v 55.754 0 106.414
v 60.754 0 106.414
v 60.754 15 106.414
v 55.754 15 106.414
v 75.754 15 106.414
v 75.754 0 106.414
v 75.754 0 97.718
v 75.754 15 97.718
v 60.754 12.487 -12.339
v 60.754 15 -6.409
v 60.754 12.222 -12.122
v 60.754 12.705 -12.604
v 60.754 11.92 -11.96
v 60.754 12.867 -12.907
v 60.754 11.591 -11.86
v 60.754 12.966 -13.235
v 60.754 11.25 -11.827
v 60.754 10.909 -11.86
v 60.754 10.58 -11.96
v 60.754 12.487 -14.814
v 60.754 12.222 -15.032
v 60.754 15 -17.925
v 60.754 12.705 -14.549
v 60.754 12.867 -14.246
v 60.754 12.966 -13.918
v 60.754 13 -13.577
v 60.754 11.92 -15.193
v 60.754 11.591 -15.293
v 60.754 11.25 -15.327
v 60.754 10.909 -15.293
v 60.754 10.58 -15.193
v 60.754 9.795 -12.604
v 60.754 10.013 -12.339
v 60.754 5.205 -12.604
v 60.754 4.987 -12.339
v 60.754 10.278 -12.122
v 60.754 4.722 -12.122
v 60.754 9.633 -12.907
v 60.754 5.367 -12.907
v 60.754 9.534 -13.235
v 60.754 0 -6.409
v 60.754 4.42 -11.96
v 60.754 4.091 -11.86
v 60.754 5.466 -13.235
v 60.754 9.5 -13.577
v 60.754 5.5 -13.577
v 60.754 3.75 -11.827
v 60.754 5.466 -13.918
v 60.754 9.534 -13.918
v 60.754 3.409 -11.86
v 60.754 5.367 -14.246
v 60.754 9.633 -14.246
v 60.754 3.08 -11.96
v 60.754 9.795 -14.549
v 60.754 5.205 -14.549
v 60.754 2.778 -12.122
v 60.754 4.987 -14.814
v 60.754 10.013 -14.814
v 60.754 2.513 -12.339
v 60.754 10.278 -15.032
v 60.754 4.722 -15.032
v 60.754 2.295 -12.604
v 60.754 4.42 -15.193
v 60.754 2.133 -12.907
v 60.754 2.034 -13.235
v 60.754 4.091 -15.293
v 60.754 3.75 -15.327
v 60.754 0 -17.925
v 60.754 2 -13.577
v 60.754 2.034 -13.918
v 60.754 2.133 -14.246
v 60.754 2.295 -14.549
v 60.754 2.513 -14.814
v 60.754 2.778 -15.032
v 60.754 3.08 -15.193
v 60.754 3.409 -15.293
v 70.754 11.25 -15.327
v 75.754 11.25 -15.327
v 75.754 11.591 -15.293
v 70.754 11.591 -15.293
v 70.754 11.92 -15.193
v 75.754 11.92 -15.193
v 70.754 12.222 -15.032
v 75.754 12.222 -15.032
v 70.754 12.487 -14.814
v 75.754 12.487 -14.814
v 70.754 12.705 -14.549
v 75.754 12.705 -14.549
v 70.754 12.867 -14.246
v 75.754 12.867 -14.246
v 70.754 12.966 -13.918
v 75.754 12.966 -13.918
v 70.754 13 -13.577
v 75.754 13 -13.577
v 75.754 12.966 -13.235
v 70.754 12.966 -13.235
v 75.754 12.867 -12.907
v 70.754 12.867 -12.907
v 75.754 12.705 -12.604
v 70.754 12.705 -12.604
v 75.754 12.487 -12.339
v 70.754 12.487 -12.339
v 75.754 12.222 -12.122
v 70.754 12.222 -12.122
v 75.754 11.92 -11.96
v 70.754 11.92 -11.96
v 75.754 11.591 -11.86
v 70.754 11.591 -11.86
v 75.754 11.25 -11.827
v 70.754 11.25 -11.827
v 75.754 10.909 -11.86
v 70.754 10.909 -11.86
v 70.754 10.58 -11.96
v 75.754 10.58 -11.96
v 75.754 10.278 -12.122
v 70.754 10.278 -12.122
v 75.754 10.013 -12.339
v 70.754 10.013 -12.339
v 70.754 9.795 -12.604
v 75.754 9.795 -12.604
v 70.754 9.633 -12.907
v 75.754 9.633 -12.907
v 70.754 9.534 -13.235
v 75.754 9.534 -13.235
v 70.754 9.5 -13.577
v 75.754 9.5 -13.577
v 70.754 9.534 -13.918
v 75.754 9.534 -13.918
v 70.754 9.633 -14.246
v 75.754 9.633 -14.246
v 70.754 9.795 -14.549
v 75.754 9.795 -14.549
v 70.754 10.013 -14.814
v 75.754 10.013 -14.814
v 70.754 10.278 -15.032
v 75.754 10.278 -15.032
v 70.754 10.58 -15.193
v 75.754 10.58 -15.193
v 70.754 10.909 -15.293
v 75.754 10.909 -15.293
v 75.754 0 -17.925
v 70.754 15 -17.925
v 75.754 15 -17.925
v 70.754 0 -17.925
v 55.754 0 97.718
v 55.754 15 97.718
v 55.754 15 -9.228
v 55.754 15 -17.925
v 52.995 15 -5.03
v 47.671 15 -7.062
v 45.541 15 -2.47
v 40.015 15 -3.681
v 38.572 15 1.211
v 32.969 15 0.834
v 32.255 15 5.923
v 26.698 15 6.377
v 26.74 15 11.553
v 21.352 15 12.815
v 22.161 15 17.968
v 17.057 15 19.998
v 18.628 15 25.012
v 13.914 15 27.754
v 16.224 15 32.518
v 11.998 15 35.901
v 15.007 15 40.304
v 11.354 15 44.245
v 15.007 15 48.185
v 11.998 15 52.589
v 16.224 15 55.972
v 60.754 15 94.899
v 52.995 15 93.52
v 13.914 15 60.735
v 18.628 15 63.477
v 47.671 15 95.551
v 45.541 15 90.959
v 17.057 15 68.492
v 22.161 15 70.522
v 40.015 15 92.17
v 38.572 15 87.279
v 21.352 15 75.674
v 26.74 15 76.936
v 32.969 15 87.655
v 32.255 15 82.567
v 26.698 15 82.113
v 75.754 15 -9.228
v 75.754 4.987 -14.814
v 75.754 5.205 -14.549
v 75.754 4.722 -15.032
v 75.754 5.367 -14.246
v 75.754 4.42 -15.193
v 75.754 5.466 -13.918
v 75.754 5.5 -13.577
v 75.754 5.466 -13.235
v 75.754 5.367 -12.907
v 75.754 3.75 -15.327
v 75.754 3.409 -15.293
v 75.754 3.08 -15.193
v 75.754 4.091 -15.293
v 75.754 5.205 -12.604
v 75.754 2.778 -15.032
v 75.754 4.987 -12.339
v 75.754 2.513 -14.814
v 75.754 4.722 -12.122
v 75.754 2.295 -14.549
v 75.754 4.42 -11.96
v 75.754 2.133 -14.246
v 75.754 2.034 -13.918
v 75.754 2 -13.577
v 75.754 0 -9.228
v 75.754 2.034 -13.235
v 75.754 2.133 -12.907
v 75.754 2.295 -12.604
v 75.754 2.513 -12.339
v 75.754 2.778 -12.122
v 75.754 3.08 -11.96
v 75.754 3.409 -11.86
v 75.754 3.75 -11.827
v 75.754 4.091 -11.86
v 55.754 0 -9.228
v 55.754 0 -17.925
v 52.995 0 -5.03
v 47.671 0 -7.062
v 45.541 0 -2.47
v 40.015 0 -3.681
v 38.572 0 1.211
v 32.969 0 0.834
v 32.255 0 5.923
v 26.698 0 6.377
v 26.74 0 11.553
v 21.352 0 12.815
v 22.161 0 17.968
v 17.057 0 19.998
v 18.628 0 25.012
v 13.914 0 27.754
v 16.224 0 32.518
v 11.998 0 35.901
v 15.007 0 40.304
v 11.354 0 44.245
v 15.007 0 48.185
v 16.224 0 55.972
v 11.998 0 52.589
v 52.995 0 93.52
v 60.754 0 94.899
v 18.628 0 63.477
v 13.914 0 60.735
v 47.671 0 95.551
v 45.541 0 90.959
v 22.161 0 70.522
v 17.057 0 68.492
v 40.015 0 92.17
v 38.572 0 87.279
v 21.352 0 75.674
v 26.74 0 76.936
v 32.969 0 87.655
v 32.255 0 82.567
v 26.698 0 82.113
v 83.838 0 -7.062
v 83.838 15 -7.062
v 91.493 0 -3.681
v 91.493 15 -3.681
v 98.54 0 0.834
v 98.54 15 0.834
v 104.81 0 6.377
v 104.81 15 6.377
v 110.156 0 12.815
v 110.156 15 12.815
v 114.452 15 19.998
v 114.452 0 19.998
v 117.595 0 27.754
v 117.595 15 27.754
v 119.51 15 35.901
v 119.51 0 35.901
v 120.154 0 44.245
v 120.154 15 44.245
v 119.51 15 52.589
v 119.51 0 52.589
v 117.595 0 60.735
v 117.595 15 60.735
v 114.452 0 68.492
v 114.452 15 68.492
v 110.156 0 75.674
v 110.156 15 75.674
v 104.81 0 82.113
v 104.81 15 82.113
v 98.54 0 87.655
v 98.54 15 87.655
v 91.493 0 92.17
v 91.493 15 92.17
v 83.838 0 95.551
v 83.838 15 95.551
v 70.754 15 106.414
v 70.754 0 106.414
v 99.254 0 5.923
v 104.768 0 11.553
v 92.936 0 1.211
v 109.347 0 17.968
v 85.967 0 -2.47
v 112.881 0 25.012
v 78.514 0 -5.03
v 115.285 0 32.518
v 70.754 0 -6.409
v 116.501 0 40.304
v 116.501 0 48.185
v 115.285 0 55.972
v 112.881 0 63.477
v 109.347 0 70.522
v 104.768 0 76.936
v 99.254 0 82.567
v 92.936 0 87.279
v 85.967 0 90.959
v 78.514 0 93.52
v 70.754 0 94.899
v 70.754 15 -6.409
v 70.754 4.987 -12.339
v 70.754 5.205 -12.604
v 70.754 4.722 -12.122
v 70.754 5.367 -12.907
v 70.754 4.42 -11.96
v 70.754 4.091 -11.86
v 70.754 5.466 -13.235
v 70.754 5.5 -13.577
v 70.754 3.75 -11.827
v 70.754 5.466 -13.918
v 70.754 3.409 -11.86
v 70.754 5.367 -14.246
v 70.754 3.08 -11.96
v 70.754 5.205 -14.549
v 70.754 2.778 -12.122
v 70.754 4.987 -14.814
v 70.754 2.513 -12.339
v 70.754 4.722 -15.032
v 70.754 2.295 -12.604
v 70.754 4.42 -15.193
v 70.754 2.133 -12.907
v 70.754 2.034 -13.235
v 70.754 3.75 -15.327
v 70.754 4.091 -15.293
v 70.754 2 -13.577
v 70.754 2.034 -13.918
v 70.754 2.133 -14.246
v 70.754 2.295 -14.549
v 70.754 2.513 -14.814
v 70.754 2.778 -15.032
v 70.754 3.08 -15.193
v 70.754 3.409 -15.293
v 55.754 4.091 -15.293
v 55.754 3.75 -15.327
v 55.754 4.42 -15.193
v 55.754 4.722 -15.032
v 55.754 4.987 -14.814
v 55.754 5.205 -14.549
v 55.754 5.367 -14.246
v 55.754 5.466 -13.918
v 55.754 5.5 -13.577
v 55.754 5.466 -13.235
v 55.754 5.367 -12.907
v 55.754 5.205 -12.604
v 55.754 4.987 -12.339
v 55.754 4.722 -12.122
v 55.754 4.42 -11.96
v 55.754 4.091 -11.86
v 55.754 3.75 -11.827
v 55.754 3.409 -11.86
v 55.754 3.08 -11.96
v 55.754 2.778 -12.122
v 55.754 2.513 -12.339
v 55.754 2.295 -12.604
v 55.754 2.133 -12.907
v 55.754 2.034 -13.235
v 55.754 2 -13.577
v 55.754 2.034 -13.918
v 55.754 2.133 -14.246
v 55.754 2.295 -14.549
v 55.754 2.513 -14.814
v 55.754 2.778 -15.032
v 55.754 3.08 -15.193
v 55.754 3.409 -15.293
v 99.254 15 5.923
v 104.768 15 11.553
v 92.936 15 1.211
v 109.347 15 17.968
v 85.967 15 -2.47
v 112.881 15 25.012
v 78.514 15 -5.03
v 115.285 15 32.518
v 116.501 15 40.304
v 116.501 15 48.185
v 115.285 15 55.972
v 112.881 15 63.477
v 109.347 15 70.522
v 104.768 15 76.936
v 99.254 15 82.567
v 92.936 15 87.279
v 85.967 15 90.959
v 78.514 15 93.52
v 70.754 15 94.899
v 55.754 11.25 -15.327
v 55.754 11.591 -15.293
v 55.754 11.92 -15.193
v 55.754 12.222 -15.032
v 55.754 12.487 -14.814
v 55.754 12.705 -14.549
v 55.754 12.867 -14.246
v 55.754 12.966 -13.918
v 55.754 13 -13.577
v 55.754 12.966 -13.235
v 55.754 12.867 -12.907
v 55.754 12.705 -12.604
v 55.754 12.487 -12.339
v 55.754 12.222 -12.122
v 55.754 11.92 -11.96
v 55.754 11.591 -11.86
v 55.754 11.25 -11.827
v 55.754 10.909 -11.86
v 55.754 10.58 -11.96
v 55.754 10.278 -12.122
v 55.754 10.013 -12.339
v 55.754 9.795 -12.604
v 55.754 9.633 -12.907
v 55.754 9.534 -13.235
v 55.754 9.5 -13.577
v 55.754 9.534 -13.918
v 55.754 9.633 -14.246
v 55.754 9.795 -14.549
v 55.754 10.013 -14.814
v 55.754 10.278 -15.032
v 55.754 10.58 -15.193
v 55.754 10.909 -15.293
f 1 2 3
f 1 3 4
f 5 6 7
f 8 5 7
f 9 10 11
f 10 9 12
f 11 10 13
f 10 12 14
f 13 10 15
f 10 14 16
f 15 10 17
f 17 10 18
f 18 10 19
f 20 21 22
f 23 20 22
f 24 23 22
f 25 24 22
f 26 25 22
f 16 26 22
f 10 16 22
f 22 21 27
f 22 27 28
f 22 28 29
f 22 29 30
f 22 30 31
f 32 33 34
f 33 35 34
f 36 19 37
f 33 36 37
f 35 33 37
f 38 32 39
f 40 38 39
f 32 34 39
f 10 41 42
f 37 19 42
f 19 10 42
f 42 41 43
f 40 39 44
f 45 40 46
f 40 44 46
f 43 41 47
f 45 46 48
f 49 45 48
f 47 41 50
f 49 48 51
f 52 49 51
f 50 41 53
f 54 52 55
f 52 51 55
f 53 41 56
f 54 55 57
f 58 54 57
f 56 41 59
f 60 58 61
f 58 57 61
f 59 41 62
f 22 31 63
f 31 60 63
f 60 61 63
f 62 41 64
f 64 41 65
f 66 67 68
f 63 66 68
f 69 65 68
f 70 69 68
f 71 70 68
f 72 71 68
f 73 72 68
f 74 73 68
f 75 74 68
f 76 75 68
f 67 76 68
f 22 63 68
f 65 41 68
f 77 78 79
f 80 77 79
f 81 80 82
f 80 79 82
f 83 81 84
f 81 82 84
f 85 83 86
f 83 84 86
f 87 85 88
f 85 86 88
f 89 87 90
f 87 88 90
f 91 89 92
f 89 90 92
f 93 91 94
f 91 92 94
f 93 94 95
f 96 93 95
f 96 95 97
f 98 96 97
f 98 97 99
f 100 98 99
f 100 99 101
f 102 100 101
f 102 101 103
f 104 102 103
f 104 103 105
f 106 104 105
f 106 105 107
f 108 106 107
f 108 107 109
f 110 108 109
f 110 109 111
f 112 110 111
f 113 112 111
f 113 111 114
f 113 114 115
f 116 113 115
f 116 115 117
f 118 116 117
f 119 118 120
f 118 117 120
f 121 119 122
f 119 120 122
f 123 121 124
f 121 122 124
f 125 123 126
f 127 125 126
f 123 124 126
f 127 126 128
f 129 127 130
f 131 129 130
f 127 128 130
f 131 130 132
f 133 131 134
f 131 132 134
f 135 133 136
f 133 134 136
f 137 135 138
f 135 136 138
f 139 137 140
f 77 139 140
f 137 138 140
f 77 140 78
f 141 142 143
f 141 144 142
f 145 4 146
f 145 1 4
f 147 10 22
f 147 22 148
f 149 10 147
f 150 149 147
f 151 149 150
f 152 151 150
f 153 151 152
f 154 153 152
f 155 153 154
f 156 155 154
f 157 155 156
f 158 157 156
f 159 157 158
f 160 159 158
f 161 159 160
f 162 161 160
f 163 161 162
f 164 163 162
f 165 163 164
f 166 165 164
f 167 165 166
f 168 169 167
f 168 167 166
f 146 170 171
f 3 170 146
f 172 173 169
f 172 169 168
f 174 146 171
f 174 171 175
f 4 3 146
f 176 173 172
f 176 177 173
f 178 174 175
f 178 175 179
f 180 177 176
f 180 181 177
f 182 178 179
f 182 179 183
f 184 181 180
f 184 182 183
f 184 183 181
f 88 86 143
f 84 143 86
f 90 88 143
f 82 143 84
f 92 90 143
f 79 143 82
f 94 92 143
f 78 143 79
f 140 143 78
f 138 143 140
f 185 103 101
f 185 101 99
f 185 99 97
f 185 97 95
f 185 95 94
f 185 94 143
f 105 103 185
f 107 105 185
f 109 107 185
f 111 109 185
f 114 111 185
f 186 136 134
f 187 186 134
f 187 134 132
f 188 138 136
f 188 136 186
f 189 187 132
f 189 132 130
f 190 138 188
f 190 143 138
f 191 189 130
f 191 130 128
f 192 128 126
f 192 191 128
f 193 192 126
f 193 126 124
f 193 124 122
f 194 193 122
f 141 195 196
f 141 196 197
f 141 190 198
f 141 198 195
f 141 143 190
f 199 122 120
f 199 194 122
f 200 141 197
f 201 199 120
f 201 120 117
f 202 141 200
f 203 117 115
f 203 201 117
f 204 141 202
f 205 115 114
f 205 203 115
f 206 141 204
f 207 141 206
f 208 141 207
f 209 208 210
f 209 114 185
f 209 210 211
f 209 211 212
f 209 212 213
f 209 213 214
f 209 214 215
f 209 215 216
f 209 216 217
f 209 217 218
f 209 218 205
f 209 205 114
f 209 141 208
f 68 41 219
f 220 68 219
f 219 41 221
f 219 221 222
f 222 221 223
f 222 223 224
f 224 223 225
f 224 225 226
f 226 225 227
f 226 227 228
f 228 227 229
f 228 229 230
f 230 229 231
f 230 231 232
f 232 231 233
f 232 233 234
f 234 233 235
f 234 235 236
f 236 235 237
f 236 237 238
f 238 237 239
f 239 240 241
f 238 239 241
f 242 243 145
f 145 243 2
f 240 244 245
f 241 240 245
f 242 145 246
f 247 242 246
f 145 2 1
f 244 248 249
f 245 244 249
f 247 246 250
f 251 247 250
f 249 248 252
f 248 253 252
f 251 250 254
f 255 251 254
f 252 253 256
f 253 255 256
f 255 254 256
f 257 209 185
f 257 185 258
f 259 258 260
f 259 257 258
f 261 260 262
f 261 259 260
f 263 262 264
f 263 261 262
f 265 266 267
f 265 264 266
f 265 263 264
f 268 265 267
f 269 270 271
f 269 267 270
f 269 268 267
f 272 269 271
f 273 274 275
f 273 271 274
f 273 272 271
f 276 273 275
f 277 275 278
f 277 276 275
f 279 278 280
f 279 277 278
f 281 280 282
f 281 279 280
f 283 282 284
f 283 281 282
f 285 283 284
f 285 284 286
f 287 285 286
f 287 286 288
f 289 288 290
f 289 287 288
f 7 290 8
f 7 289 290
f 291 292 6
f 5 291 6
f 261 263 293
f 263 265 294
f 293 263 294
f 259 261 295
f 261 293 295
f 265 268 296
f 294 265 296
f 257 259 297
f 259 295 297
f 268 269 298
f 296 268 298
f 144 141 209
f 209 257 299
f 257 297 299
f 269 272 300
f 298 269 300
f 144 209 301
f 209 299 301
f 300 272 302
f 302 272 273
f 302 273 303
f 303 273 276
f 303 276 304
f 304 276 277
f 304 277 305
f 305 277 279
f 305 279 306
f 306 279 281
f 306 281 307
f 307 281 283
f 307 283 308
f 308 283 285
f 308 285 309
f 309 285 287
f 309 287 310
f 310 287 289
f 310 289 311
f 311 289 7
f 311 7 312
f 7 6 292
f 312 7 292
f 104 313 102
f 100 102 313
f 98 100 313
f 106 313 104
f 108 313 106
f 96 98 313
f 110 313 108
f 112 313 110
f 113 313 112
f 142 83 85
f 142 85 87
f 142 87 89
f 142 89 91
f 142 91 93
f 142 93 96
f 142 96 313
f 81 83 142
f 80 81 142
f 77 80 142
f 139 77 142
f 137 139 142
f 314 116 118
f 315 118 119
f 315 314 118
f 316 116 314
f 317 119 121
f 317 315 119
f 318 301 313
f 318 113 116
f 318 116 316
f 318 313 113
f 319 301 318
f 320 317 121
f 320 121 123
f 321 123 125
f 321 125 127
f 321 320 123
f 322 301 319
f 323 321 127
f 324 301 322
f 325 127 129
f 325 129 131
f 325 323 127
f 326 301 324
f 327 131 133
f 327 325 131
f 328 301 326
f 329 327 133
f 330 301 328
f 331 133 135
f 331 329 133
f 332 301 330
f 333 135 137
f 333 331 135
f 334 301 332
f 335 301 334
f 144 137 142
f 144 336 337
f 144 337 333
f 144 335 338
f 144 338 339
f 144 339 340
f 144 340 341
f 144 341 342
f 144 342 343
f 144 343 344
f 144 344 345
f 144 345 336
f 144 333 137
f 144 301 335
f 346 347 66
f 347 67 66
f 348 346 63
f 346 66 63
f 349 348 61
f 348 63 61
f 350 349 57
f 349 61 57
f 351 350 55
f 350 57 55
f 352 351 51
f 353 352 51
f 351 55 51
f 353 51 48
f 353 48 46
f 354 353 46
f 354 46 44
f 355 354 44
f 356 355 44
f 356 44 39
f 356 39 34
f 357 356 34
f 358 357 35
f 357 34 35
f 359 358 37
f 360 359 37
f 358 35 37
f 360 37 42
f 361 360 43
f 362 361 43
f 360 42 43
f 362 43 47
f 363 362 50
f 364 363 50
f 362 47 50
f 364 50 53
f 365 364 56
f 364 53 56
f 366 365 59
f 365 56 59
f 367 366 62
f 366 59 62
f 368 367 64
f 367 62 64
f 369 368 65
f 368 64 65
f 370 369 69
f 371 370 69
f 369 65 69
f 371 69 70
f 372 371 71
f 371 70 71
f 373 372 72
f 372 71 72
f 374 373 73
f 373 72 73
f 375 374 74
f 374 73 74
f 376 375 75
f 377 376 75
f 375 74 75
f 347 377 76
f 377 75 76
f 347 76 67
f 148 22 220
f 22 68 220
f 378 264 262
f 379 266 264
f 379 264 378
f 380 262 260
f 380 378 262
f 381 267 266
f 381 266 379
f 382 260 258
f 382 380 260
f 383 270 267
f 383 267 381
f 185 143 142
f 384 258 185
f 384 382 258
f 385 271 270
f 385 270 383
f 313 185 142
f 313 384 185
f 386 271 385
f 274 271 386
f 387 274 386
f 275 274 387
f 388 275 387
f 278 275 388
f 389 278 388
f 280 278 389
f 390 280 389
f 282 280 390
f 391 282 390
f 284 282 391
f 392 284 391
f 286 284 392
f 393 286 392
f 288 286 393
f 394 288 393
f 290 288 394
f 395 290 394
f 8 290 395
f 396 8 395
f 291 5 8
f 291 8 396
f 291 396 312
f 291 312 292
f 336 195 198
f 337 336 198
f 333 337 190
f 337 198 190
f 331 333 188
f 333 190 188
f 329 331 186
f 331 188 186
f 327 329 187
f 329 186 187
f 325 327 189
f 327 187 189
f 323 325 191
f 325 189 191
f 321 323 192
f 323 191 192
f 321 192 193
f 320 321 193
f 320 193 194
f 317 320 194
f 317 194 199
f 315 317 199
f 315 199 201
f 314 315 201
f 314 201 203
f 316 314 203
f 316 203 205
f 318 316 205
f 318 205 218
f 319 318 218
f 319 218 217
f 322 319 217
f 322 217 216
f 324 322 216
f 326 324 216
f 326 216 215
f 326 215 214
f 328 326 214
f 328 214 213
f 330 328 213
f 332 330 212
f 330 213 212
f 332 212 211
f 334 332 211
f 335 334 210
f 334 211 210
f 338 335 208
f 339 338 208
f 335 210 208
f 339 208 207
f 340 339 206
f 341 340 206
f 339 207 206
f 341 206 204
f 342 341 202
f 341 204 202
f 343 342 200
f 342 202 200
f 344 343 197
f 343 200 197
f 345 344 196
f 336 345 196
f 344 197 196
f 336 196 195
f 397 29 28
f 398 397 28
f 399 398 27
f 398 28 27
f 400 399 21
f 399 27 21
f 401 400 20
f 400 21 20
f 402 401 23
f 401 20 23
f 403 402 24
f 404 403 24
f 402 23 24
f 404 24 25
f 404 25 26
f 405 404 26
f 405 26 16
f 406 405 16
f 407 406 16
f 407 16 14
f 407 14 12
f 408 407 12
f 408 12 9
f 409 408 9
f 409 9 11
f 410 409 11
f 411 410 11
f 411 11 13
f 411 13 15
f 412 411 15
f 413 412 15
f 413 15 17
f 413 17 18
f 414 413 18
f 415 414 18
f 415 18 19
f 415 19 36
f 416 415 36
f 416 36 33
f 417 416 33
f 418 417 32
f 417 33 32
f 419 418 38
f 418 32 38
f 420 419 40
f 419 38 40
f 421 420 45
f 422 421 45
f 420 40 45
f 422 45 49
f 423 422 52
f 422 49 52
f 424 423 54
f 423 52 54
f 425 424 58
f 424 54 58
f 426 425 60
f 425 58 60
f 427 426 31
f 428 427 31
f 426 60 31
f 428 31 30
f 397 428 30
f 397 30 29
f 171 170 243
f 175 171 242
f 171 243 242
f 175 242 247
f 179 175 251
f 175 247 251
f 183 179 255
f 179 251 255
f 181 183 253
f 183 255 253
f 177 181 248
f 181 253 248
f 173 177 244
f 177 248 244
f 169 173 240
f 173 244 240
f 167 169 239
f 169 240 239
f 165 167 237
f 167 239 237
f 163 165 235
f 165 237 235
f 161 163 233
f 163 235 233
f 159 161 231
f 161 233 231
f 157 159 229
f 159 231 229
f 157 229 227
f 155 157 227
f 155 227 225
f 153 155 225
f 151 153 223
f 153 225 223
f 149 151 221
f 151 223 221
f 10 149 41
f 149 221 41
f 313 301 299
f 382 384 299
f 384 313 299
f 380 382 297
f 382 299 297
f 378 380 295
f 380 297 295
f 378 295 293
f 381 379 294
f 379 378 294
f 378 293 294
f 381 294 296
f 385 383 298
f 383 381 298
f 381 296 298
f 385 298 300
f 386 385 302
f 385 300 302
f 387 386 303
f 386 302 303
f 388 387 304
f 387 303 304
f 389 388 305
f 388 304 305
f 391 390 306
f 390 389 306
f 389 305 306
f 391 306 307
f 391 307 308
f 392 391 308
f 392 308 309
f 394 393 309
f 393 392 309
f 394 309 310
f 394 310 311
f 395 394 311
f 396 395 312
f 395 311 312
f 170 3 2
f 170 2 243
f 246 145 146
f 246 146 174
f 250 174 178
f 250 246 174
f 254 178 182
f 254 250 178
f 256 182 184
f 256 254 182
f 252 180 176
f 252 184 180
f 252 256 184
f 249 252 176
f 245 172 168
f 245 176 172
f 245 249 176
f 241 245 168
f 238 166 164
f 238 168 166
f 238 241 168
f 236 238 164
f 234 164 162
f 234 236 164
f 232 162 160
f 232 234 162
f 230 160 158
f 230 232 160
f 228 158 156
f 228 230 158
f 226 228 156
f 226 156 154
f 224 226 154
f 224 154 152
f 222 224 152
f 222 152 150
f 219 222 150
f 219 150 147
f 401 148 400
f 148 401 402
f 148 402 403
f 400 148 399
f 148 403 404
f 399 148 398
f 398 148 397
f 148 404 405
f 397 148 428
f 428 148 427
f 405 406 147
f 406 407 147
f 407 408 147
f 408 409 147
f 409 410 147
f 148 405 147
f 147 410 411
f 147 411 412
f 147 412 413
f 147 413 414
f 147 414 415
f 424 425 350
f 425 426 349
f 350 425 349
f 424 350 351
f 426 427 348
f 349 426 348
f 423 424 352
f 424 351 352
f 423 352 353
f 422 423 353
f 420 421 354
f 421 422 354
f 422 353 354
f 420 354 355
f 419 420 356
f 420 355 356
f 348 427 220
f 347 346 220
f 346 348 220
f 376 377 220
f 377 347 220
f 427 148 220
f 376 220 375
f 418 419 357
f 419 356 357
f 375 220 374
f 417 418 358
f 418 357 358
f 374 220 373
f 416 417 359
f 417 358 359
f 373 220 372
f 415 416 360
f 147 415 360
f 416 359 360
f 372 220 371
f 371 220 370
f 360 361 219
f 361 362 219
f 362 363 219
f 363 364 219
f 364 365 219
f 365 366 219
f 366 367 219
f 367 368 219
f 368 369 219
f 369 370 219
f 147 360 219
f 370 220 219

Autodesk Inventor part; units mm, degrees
ref_plane "YZ Plane" through (0, 0, 0) normal (1, 0, 0) x (0, 1, 0)
ref_plane "XZ Plane" through (0, 0, 0) normal (0, 1, 0) x (-1, 0, 0)
ref_plane "XY Plane" through (0, 0, 0) normal (0, 0, 1) x (1, 0, 0)
sketch "Sketch1" plane through (0, 0, 0) normal (0, 1, 0) x (-1, 0, 0)
  circle A0 centre (-65.7542, 44.2448) radius 50.8 projected
  circle A1 centre (-65.7542, 44.2448) radius 50.9
  line L0 (-65.7542, 98.6448) -> (-65.7542, -10.1552)
  line L1 (-70.7542, 98.4145) -> (-70.7542, 94.8986)
  line L2 (-70.7542, -6.4091) -> (-70.7542, -9.925)
  line L3 (-60.7542, 98.4145) -> (-60.7542, 94.8986)
  line L4 (-60.7542, -6.4091) -> (-60.7542, -9.925)
  line L5 (-60.7542, 98.4145) -> (-60.7542, 106.4145)
  line L6 (-60.7542, 106.4145) -> (-55.7542, 106.4145)
  line L7 (-55.7542, 106.4145) -> (-55.7542, 97.7178)
  line L8 (-70.7542, 98.4145) -> (-70.7542, 106.4145)
  line L9 (-70.7542, 106.4145) -> (-75.7542, 106.4145)
  line L10 (-75.7542, 106.4145) -> (-75.7542, 97.7178)
  arc A2 (-60.7542, 98.4145) -> (-70.7542, 98.4145) centre (-65.7542, 44.2448) ccw
  line L11 (-70.7542, -9.925) -> (-70.7542, -17.925)
  line L12 (-70.7542, -17.925) -> (-75.7542, -17.925)
  line L13 (-75.7542, -17.925) -> (-75.7542, -9.2282)
  line L14 (-60.7542, -9.925) -> (-60.7542, -17.925)
  line L15 (-60.7542, -17.925) -> (-55.7542, -17.925)
  line L16 (-55.7542, -17.925) -> (-55.7542, -9.2282)
  arc A3 (-55.7542, -9.2282) -> (-55.7542, 97.7178) centre (-65.7542, 44.2448) ccw
  arc A4 (-75.7542, 97.7178) -> (-75.7542, -9.2282) centre (-65.7542, 44.2448) ccw
  arc A5 (-70.7542, -9.925) -> (-60.7542, -9.925) centre (-65.7542, 44.2448) ccw
  point P0 (0, 0)
  dimension "d0" = 0.1
  dimension "d4" = 5
  dimension "d5" = 5
  dimension "d6" = 5
  dimension "d7" = 5
  dimension "d10" = 8
  dimension "d11" = 5
  dimension "d12" = 8
  dimension "d13" = 5
  dimension "d15" = 3.5
  dimension "d16" = 8
  dimension "d17" = 5
  dimension "d18" = 8
  dimension "d19" = 5
extrude "Extrusion1" add sketch "Sketch1" along normal blind 15 contours L3 L5 L6 L7 A3 L16 L15 L14 L4 A1 | A1 L2 L11 L12 L13 A4 L10 L9 L8 L1
sketch "Sketch2" plane through (75.7542, 0, 106.4145) normal (1, 0, 0) x (0, 0, -1)
  circle A0 centre (119.9911, 11.25) radius 1.75
  circle A1 centre (119.9911, 3.75) radius 1.75
  circle A2 centre (119.9911, 3.75) radius 3.5
  circle A3 centre (119.9911, 11.25) radius 3.5
  line L0 (115.6427, 15) -> (124.3395, 15) projected
  line L1 (119.9911, 15) -> (119.9911, 11.25)
  line L2 (119.9911, 11.25) -> (119.9911, 7.5)
  line L3 (119.9911, 7.5) -> (119.9911, 3.75)
  line L4 (119.9911, 3.75) -> (119.9911, 0)
  line L5 (124.3395, 0) -> (112.8236, 0) projected
  point P0 (106.4145, 0)
  dimension "d20" = 3.5
  dimension "d21" = 3.5
  dimension "d22" = 7
  dimension "d23" = 7
extrude "Extrusion2" cut sketch "Sketch2" against normal through all contours A0 L2 L1 | L1 L2 A0 | L3 L4 A1 | A1 L4 L3
properties part number "bottle clamp"
